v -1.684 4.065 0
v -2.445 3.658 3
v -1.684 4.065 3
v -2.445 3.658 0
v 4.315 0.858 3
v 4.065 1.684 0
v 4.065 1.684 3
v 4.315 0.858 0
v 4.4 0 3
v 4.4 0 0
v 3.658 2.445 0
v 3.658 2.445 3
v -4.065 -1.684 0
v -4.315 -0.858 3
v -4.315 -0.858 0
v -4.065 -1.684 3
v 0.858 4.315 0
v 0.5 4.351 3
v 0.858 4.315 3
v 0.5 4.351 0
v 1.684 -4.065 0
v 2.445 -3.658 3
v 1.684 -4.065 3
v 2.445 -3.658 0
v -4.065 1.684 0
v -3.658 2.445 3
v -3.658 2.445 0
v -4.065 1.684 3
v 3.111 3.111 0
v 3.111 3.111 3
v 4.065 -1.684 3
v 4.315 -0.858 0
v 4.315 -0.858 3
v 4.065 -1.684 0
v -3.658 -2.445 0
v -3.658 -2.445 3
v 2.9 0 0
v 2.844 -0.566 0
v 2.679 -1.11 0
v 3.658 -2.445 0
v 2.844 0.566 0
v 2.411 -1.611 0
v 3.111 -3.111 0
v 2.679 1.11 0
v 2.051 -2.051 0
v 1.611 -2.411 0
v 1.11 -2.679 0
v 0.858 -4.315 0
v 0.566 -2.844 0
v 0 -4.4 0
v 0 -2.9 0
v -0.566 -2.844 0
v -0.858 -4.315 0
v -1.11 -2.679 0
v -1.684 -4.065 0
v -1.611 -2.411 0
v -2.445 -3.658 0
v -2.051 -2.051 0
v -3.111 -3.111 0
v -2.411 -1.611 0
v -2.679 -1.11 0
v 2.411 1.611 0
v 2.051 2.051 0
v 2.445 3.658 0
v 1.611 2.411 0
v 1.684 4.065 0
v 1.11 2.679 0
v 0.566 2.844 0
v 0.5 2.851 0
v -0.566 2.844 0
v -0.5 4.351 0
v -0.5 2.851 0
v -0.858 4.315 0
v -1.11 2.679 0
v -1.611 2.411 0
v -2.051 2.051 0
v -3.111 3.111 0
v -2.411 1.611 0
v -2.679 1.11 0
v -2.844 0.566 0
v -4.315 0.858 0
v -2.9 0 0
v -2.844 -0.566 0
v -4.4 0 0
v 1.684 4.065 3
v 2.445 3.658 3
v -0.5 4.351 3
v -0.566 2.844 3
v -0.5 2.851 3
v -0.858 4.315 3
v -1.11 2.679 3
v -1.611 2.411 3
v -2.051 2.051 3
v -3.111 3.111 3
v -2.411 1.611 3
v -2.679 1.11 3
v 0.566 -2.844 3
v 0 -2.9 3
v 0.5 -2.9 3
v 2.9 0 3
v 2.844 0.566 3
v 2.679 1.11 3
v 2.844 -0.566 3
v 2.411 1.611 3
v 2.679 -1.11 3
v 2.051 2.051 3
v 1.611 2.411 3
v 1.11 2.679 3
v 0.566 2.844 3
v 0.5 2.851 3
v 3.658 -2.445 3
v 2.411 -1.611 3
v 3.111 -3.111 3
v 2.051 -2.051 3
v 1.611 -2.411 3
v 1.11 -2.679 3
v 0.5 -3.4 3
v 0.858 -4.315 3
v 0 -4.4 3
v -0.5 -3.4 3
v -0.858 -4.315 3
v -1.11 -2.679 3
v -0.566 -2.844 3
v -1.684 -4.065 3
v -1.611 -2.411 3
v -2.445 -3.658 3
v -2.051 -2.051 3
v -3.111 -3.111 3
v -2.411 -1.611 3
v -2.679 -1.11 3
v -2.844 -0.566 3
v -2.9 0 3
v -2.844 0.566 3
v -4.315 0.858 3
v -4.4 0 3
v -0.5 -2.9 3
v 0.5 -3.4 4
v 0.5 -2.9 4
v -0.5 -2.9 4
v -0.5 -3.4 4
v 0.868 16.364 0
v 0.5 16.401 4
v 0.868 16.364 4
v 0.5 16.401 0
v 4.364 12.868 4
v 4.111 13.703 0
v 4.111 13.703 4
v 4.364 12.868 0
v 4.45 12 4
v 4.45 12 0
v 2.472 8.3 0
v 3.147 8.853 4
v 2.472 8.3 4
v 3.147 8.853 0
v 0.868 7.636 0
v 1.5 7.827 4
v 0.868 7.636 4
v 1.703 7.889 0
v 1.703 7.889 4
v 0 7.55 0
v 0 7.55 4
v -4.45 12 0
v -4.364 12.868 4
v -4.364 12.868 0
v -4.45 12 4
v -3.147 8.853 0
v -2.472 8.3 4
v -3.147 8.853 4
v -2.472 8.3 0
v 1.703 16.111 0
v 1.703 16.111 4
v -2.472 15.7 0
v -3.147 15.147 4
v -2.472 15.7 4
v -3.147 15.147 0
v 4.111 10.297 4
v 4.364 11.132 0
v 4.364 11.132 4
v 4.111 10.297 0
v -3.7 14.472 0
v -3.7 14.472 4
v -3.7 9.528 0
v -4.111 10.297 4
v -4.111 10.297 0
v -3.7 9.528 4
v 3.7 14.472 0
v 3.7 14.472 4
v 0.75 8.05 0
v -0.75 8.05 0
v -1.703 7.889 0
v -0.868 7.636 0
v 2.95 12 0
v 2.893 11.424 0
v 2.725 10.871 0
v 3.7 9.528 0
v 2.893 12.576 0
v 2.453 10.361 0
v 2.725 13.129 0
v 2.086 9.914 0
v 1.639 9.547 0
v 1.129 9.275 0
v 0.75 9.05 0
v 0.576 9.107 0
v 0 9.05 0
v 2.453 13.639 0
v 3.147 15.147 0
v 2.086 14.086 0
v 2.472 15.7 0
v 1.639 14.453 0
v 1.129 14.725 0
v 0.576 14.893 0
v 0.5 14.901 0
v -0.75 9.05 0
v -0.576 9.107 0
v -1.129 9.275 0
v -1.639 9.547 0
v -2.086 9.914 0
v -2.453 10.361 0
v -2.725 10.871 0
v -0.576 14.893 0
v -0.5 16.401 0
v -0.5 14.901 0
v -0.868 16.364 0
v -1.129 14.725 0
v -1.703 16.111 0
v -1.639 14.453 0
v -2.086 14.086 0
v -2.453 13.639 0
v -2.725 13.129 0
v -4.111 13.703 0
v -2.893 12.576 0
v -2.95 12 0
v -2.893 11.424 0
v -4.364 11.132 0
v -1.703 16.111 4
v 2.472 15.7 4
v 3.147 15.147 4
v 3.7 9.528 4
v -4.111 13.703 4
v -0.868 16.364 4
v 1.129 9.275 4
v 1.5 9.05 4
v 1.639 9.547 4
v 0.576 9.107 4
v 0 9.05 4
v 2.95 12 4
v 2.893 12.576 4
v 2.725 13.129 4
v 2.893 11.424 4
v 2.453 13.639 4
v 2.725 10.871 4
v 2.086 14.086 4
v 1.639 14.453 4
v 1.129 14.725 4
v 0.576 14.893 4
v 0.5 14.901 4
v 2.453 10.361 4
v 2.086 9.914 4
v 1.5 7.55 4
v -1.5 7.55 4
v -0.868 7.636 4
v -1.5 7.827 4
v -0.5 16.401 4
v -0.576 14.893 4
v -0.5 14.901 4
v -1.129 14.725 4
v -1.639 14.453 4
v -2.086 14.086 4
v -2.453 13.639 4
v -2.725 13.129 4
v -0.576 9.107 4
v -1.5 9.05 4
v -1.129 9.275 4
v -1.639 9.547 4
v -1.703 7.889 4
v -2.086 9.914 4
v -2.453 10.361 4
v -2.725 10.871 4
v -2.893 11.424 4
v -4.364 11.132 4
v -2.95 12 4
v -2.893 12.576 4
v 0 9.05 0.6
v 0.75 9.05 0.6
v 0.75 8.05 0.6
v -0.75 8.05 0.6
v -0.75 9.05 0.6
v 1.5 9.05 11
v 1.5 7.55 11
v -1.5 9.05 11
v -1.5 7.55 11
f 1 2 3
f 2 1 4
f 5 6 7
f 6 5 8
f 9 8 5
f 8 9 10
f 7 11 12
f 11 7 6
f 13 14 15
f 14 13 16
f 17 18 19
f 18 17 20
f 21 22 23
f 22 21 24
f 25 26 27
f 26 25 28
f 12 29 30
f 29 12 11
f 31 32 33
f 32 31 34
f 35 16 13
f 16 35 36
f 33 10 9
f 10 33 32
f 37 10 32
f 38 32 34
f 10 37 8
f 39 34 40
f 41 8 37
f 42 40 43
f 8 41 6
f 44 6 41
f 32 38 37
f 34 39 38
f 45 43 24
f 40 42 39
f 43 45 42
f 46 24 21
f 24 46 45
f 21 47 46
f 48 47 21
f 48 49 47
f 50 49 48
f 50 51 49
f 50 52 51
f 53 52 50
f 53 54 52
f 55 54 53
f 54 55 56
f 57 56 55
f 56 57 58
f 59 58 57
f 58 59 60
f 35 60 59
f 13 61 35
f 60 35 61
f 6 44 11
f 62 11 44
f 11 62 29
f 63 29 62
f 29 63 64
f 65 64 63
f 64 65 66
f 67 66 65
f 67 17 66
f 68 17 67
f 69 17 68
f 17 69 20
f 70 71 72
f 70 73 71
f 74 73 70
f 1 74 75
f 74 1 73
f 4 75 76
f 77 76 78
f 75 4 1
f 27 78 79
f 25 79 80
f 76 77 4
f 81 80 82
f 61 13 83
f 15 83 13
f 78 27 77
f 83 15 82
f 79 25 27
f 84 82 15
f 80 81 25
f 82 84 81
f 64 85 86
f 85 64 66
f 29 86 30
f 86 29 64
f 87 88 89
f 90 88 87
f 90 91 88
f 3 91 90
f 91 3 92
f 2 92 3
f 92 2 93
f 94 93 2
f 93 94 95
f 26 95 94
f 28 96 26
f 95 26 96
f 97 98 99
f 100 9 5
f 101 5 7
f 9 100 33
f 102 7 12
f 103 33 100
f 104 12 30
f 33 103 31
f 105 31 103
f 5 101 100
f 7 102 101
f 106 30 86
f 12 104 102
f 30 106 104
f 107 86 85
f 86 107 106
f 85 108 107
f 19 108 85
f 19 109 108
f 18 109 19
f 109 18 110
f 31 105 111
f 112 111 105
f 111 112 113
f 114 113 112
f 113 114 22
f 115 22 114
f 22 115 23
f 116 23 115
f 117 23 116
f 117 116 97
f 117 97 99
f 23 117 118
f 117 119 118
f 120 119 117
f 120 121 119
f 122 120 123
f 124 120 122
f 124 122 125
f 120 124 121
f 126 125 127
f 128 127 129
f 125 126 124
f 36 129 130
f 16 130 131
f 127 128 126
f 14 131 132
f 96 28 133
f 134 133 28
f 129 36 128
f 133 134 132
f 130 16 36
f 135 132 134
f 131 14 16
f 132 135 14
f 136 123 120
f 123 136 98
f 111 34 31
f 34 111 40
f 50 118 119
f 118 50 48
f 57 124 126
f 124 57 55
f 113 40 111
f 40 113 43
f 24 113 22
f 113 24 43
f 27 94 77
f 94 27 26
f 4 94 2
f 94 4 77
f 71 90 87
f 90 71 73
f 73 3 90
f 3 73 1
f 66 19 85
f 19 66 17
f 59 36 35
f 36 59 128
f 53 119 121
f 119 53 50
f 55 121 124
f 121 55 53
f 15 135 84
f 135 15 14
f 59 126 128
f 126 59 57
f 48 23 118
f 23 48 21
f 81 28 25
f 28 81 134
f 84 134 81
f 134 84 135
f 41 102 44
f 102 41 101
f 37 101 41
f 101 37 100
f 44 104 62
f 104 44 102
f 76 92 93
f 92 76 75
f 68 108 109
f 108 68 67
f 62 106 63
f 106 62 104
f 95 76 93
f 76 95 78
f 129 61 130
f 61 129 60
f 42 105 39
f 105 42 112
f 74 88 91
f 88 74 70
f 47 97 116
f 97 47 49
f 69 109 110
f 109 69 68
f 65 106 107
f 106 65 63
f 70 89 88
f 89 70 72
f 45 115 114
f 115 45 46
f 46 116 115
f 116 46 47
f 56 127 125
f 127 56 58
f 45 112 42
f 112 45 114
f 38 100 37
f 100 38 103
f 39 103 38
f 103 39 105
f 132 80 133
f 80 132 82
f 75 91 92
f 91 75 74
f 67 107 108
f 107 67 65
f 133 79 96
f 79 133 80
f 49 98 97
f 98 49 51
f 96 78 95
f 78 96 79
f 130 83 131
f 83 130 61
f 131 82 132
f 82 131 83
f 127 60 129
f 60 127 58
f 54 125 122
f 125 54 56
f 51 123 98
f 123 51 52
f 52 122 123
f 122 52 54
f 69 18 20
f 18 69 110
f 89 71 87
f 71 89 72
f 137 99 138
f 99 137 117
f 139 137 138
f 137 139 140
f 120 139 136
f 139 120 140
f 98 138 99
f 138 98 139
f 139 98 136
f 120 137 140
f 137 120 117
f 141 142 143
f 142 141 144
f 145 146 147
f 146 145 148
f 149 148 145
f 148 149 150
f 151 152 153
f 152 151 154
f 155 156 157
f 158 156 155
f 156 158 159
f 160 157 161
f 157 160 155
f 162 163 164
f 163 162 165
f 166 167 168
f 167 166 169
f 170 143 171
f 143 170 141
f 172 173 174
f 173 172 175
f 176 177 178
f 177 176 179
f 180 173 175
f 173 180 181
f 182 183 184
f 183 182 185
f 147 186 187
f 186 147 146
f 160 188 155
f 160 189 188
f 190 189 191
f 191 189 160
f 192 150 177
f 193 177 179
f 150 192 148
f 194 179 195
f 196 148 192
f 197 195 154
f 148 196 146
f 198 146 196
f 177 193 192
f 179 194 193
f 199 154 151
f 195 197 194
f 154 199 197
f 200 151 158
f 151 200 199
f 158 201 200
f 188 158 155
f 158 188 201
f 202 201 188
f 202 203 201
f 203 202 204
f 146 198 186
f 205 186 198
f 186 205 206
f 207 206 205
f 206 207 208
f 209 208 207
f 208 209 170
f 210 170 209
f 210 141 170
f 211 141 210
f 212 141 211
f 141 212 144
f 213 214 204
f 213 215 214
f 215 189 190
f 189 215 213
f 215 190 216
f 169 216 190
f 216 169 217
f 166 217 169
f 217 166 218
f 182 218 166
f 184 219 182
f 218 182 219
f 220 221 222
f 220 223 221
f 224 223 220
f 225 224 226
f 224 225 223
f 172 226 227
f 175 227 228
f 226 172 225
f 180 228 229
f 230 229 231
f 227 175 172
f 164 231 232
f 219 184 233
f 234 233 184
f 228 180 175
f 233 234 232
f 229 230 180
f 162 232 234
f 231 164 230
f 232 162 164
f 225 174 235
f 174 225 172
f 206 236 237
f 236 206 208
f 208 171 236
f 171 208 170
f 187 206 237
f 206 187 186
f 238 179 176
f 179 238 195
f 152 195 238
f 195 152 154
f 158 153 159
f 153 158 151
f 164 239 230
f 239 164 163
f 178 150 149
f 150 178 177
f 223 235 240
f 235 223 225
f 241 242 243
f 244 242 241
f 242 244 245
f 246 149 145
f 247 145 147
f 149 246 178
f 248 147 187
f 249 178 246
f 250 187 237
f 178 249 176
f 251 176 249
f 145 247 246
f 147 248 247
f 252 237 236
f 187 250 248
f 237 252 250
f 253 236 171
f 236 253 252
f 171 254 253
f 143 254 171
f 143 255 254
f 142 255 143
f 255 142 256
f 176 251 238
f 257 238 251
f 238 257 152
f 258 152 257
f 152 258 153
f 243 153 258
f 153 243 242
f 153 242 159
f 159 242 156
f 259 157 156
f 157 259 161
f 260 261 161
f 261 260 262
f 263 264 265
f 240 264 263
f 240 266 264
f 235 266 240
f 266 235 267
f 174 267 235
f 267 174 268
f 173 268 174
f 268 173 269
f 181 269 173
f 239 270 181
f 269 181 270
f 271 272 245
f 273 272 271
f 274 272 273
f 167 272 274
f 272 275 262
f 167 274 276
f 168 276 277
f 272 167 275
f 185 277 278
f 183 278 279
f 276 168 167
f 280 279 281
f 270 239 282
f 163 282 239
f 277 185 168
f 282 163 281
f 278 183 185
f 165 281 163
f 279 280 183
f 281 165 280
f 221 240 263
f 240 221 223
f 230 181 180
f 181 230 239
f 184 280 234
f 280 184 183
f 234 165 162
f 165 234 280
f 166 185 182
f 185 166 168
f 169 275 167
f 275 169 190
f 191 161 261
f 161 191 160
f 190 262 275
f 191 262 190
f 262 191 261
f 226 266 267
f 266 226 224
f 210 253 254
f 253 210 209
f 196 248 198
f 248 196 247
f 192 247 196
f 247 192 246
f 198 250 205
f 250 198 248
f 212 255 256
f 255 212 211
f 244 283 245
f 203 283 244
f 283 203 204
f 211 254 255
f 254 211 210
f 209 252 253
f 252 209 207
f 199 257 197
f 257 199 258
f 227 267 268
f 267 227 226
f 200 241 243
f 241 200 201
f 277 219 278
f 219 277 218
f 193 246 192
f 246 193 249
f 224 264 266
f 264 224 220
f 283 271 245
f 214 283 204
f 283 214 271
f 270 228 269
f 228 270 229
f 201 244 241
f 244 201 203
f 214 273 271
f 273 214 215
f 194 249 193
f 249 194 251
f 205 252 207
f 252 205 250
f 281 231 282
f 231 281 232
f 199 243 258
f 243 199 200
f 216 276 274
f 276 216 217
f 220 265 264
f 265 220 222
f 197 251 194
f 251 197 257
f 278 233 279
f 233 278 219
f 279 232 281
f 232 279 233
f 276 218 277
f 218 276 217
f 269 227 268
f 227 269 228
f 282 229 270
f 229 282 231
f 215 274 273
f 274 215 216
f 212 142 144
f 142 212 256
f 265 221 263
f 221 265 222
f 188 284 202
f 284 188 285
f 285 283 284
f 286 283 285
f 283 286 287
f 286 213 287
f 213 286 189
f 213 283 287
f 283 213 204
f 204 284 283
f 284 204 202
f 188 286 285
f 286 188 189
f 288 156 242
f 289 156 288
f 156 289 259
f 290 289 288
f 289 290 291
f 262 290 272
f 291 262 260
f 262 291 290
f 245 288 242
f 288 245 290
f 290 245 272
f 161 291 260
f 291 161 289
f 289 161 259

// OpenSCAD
// montageringetjes voor motortjes CX-10. Klem boven en onder PCB.
$fn=32;
NOZZLE=0.4;
THICKNESS=3; // 3 voor genoeg klemkracht in PETG met diameter 5.8
DIA = 5.8;
LEGLENGTH=7;

// Motor is 6mm diameter, maar bovenring en onderring moeten andere binnendiameter ivm klemkracht

module ring(dia=DIA, dikte=THICKNESS){
    difference(){
        cylinder(d=dia+THICKNESS,h=dikte);
        cylinder(d=dia,h=dikte);    
        translate([-0.5,0.6*THICKNESS,0]) cube([1,THICKNESS,dikte]); // draadjes / klemconstructieonderbreking
        }
    }

// boven
module bovenring(dia=DIA){
    ring(dia);
translate([-0.5,-0.5*dia-0.5,THICKNESS]) cube([1,0.5,1]);  // anti-rotatie pinnetje valt in PCB
}


   //onder, oude
     /*
    translate([0,12,0])
    difference(){
        cylinder(d=6+THICKNESS,h=LEGLENGTH+THICKNESS);
        cylinder(d=6,h=LEGLENGTH+THICKNESS);    
        translate([-0.5*THICKNESS,0.6*THICKNESS,0]) cube([THICKNESS,THICKNESS,LEGLENGTH+THICKNESS]); // draadjes / klemconstructieonderbreking
        }
        */
        
        // onder, nieuwe
module onderring(dia=DIA, dikte=THICKNESS){
    difference(){
        ring(dia, dikte);
        translate([-0.75,-0.5*dia-1,0]) #cube([1.5,1,0.6]); // anti-rotatie uitholling valt over SMD led
        }
        translate([-0.5*THICKNESS,-0.5*(dia+THICKNESS),dikte]) cube([THICKNESS, 0.5*THICKNESS, LEGLENGTH]);
    }

bovenring();
    translate([0,12,0]) onderring(dia=5.9, dikte = 4);
   
